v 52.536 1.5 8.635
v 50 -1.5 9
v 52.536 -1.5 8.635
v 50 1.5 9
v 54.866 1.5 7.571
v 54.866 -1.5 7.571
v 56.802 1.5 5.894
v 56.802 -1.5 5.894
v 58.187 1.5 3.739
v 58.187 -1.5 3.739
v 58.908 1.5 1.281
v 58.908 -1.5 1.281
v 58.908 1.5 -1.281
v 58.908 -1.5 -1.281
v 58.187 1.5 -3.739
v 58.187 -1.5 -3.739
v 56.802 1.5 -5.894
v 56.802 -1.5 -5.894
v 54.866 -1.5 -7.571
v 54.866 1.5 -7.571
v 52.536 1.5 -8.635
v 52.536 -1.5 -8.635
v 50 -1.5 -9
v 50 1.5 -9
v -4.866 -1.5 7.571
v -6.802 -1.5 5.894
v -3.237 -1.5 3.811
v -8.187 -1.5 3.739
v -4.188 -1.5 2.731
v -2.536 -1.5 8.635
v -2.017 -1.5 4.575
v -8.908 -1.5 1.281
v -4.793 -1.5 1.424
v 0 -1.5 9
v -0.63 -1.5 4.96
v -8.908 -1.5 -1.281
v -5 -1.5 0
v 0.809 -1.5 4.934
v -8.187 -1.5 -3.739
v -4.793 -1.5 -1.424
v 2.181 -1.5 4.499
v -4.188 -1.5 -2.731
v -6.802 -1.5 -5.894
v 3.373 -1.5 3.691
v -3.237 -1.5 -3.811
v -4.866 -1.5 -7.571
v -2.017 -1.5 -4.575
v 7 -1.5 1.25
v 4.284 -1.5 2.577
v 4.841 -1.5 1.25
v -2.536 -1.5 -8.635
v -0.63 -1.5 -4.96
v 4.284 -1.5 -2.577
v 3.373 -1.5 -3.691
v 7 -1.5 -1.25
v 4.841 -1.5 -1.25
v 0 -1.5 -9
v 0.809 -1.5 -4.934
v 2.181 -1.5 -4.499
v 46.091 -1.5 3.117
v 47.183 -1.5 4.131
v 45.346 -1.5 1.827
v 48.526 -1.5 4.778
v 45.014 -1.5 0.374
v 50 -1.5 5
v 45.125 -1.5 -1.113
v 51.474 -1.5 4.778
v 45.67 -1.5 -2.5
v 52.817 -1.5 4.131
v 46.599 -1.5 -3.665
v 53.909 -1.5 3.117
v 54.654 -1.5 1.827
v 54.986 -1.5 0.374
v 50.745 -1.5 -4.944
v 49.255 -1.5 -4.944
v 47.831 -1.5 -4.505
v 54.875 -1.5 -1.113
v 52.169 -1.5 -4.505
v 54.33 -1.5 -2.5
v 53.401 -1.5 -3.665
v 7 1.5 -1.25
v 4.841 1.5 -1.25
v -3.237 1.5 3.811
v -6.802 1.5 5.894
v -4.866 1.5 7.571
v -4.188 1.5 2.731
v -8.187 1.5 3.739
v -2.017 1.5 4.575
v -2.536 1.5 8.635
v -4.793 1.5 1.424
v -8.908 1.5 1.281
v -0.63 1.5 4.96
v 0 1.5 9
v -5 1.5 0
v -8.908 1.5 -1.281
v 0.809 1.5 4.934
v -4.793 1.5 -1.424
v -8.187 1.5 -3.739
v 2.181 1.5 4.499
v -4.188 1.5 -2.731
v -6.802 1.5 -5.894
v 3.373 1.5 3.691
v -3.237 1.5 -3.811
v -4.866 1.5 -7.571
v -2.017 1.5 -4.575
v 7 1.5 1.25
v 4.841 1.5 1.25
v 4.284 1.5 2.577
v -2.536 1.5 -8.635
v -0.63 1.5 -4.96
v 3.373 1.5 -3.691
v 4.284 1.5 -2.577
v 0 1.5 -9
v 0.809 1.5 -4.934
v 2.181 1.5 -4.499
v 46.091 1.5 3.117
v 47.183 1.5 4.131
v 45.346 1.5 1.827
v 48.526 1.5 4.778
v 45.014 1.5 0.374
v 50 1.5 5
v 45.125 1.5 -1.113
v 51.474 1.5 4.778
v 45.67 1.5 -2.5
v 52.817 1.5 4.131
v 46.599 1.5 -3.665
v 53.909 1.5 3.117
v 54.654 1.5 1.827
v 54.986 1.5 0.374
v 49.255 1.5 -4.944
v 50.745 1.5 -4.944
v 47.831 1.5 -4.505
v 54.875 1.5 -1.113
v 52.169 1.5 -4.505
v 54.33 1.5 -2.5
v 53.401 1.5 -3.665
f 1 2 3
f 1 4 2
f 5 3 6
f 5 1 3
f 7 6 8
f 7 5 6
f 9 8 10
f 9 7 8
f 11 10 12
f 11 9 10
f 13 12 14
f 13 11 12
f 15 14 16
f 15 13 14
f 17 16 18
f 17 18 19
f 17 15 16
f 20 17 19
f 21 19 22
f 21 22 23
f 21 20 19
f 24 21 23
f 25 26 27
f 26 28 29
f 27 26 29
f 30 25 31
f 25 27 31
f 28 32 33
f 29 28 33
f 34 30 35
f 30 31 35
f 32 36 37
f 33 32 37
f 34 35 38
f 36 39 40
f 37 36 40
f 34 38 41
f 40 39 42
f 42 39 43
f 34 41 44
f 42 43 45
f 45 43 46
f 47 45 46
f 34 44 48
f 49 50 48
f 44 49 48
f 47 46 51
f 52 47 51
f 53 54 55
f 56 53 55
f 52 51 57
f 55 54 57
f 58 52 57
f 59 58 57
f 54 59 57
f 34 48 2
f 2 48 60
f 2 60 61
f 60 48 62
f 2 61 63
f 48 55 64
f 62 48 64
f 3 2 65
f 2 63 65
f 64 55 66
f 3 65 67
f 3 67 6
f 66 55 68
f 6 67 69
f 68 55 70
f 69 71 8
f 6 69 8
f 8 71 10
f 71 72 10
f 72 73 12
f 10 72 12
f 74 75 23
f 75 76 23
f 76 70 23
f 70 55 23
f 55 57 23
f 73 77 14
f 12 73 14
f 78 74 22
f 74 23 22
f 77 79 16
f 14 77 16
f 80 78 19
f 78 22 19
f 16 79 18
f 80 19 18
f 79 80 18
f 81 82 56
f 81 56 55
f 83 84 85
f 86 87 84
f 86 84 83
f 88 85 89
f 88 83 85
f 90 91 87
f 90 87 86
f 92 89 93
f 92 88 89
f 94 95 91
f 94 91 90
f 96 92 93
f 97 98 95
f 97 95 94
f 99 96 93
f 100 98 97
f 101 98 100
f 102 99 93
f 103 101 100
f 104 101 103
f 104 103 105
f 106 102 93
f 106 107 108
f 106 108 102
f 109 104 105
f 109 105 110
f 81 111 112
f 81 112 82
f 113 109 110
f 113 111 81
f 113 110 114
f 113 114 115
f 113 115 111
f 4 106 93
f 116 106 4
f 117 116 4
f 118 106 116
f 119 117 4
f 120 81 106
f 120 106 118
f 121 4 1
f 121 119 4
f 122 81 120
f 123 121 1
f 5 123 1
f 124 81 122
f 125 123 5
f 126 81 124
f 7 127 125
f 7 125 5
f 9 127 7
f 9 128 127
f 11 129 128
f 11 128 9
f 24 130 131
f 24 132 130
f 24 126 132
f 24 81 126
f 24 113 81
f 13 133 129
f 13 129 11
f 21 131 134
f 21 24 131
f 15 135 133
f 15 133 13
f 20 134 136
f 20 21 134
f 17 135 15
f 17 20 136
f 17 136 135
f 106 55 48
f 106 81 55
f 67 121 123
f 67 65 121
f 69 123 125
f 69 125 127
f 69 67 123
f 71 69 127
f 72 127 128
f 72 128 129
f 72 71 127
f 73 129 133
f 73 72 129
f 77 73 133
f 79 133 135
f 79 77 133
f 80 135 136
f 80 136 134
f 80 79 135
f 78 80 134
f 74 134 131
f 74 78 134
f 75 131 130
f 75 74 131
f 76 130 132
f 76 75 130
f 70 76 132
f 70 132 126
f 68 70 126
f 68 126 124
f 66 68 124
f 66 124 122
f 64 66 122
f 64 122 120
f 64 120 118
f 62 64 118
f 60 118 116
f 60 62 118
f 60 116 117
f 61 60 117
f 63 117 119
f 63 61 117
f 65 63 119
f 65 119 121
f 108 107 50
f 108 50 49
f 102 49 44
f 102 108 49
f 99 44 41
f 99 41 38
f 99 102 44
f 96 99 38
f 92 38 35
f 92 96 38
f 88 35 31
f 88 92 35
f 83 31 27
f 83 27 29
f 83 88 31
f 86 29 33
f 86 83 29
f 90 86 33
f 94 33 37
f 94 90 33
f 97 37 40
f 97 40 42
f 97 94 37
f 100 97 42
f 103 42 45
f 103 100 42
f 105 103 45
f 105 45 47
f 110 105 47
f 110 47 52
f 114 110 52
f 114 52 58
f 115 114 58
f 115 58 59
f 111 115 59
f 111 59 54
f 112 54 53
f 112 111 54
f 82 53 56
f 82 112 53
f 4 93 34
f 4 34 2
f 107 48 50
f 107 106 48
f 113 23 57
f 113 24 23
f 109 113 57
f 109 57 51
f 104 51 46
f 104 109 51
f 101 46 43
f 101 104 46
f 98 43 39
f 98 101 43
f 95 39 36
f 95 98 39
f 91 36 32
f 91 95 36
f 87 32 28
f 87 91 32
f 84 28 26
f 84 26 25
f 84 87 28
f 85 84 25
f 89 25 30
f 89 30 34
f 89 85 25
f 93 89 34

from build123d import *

# Parameters (mm, degrees)
SKETCH1_R           = 5
BOSS_EXTRUDE1_DEPTH = 1.5


with BuildPart() as part:
    # Sketch1 → Boss-Extrude1 (new, symmetric)
    with BuildSketch(Plane(origin=(0, 0, 0), x_dir=(1, 0, 0), z_dir=(0, 1, 0))):
        with BuildLine():
            Line((50, 9), (0, 9))
            ThreePointArc((0, 9), (-9, 0), (0, -9))
            Line((0, -9), (50, -9))
            ThreePointArc((50, -9), (59, 0), (50, 9))
        make_face()
        with BuildLine():
            ThreePointArc((4.841229183, -1.25), (-5, 0), (4.841229183, 1.25))
            Line((4.841229183, 1.25), (7, 1.25))
            Line((7, 1.25), (7, -1.25))
            Line((7, -1.25), (4.841229183, -1.25))
        make_face(mode=Mode.SUBTRACT)
        with Locations(Location((50, 0, 0), (0, 0, 270))):
            Circle(SKETCH1_R, mode=Mode.SUBTRACT)
    extrude(amount=BOSS_EXTRUDE1_DEPTH, both=True)


solid = part.part
